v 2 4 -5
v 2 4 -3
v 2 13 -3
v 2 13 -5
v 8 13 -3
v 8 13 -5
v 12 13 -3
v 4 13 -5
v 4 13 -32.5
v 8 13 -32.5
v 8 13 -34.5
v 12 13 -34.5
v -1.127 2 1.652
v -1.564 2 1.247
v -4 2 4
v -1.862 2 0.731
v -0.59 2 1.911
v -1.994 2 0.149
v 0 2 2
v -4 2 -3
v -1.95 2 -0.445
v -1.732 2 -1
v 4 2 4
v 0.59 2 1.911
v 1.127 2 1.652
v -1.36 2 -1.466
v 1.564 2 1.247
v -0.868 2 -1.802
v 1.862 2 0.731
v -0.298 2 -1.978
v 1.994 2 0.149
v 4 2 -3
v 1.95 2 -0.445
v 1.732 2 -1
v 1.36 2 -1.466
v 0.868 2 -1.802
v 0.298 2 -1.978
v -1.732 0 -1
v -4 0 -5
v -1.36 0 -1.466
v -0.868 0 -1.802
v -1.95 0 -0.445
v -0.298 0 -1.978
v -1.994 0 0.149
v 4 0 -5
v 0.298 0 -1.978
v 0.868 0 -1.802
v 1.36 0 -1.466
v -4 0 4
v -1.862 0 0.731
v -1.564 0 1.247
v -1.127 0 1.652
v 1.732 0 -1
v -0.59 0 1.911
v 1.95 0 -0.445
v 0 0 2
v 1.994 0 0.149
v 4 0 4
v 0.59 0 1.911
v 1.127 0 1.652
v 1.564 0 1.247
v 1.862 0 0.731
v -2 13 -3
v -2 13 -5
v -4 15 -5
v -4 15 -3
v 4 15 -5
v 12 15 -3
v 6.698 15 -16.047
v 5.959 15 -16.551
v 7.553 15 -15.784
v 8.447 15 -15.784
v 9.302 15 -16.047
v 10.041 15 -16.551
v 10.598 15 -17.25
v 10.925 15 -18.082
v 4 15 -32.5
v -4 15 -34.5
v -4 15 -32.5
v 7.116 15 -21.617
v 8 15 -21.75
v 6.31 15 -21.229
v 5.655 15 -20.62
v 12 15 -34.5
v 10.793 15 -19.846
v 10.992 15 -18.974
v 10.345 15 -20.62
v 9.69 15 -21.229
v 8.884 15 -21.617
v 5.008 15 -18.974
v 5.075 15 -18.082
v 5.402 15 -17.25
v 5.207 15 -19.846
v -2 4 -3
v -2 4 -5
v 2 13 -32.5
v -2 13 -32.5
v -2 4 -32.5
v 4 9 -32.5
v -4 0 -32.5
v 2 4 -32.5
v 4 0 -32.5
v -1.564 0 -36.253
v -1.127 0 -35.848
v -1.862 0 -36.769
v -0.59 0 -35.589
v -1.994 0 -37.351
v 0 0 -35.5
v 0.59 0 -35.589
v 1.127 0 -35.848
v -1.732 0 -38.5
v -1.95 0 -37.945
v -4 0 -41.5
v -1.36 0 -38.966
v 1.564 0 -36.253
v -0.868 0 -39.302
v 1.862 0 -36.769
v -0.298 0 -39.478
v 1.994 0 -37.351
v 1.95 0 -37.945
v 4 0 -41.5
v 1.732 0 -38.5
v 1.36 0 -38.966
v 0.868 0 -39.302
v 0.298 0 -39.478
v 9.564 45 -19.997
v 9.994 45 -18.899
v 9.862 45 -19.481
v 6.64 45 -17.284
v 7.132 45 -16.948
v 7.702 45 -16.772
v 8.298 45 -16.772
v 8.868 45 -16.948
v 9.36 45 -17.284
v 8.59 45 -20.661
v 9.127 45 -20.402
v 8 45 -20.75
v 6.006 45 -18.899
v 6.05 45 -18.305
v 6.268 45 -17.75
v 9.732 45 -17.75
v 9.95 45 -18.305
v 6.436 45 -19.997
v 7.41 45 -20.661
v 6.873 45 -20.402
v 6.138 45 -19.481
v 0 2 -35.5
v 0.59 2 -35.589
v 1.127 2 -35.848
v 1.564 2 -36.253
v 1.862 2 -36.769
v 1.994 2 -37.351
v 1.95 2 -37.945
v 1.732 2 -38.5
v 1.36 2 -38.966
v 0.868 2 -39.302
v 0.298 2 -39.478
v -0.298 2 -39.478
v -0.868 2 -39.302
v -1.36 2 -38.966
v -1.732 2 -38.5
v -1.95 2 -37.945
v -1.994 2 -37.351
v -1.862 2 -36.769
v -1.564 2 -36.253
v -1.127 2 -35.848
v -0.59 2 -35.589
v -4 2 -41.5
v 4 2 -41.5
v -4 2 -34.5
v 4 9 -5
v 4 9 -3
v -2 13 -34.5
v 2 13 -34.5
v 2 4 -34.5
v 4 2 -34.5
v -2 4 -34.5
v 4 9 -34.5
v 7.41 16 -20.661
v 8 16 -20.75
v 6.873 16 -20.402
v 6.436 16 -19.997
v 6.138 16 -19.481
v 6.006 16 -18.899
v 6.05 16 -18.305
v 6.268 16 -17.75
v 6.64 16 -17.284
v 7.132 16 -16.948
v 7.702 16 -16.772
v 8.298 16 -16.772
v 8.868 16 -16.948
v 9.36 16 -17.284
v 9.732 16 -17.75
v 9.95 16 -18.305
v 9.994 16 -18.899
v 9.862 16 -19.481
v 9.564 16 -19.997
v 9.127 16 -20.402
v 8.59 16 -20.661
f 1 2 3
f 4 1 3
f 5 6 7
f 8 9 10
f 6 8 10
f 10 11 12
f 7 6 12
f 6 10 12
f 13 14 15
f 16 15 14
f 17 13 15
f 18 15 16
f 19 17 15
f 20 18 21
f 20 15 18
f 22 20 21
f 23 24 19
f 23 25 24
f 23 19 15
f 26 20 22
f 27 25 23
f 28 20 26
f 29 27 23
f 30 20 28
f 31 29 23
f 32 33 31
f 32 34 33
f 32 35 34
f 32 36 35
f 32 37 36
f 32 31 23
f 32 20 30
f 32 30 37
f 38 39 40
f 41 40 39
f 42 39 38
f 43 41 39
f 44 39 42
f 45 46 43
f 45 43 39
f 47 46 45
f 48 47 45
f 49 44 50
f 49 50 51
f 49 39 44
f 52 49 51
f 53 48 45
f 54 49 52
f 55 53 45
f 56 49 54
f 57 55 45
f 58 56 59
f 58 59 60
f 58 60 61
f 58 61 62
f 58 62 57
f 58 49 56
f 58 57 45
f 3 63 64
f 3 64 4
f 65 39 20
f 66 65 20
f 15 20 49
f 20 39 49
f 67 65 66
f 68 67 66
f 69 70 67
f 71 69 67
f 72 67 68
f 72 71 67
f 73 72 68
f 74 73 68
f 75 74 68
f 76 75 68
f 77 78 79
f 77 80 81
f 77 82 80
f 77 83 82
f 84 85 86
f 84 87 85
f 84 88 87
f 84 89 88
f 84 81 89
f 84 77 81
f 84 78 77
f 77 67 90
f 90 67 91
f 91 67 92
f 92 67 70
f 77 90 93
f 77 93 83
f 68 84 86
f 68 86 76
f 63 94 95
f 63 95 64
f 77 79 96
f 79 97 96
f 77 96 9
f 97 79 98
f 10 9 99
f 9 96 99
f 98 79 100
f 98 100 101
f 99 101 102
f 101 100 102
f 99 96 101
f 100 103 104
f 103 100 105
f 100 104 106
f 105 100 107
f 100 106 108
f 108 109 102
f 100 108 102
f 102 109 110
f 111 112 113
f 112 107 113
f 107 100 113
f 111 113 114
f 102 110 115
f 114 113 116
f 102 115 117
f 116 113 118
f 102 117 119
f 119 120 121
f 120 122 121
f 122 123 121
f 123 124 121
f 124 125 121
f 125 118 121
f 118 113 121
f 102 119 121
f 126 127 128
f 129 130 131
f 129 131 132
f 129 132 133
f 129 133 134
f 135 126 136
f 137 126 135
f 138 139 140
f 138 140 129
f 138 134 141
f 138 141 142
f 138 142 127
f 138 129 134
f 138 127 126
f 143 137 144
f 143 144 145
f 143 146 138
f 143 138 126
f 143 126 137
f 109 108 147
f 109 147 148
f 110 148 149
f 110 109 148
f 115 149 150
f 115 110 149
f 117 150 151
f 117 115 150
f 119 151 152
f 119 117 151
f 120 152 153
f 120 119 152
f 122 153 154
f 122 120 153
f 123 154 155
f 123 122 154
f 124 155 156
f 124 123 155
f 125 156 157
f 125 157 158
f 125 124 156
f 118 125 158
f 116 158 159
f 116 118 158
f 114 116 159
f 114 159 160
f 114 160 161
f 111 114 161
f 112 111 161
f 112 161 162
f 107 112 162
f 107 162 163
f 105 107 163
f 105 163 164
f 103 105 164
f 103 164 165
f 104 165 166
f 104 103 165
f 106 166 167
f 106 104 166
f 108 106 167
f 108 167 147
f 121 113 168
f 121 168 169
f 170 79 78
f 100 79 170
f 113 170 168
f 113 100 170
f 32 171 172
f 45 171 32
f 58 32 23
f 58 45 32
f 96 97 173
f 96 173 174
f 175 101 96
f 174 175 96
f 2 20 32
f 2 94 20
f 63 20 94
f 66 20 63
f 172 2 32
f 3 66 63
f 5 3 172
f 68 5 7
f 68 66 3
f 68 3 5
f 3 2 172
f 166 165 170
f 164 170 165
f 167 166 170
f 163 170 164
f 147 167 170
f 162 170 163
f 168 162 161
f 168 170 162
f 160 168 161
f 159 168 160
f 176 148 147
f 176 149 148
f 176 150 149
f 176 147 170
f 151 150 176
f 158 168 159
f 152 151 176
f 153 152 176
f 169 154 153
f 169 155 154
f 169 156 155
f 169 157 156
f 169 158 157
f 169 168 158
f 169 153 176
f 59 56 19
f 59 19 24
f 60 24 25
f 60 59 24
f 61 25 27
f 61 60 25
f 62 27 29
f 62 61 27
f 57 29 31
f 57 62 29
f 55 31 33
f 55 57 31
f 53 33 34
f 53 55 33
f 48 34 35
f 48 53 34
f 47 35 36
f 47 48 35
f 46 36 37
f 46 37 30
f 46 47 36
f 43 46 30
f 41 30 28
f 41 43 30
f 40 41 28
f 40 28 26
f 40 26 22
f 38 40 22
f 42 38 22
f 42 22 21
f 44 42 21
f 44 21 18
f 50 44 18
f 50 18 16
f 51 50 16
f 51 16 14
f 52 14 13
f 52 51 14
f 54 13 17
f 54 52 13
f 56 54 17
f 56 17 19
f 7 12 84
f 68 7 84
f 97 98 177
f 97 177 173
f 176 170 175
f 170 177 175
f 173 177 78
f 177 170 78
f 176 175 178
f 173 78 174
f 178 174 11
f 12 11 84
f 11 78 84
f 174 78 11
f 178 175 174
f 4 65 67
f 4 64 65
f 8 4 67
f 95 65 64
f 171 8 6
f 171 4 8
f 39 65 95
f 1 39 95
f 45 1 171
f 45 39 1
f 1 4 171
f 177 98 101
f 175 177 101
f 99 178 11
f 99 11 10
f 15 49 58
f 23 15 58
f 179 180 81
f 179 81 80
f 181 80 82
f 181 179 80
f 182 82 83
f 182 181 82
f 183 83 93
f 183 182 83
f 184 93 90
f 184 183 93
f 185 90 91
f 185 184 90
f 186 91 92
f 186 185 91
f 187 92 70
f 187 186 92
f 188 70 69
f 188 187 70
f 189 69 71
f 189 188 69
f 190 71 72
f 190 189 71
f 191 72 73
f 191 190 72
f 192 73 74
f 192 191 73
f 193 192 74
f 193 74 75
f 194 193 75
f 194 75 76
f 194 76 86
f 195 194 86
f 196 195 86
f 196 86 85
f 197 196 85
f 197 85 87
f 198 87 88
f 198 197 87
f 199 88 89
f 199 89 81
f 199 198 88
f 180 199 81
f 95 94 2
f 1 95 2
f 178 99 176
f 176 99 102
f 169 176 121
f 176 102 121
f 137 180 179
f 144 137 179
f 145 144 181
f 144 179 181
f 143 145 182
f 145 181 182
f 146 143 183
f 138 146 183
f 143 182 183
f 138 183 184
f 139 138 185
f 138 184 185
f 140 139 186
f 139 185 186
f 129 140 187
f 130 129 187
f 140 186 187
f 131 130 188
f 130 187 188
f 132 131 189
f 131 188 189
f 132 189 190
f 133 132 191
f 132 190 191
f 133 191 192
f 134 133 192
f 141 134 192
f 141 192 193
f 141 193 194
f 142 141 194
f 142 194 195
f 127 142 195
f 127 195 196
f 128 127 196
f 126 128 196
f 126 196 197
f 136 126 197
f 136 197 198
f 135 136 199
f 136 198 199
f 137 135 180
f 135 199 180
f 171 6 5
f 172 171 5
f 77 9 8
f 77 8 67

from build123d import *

# Parameters (mm, degrees)
SKETCH1_W             = 8
SKETCH1_H             = 8
SKETCH1_R             = 2
BOSS_EXTRUDE1_DEPTH   = 2
BOSS_EXTRUDE1_2_DEPTH = 2
SKETCH2_W             = 8
SKETCH2_H             = 2
BOSS_EXTRUDE2_DEPTH   = 15
BOSS_EXTRUDE3_REACH   = 43.512
SKETCH3_W             = 8
SKETCH3_H             = 2
CHAMFER1_SIZE         = 4
SKETCH4_W             = 4
SKETCH4_H             = 9
CUT_EXTRUDE1_DEPTH    = 44.026154836
SKETCH5_R             = 2
BOSS_EXTRUDE4_DEPTH   = 30
CHAMFER2_SIZE         = 1


with BuildPart() as part:
    # Sketch1 → Boss-Extrude1 (new body)
    with BuildSketch(Plane(origin=(0, 0, 0), x_dir=(1, 0, 0), z_dir=(0, 1, 0))):
        Rectangle(SKETCH1_W, SKETCH1_H)
        with Locations(Location((0, 0, 0), (0, 0, 270))):
            Circle(SKETCH1_R, mode=Mode.SUBTRACT)
    extrude(amount=BOSS_EXTRUDE1_DEPTH)



with BuildPart() as body_2:
    # Sketch1 → Boss-Extrude1 2 (new body)
    with BuildSketch(Plane(origin=(0, 0, 0), x_dir=(1, 0, 0), z_dir=(0, 1, 0))):
        with Locations((0, 37.5)):
            Rectangle(SKETCH1_W, SKETCH1_H)
        with Locations(Location((0, 37.5, 0), (0, 0, 270))):
            Circle(SKETCH1_R, mode=Mode.SUBTRACT)
    extrude(amount=BOSS_EXTRUDE1_2_DEPTH)


with BuildPart() as part_1:
    add(part.part)

    add(body_2.part)  # Boss-Extrude2 merges body 2
    # Sketch2 → Boss-Extrude2 (add)
    with BuildSketch(Plane.XZ):
        with Locations((0, -33.5)):
            Rectangle(SKETCH2_W, SKETCH2_H)
        with Locations((0, -4)):
            Rectangle(SKETCH2_W, SKETCH2_H)
    extrude(amount=-BOSS_EXTRUDE2_DEPTH)

    # Boss-Extrude3: up to this face of the body (flat: up to its plane)
    boss_extrude3_end = Plane(part_1.part.faces().sort_by_distance((0, 8.5, -3))[0])
    # Sketch3 → Boss-Extrude3 (add, up to the picked face)
    with BuildSketch(Plane.XY.offset(-34.5), mode=Mode.PRIVATE) as boss_extrude3_sk1:
        with Locations((8, 14)):
            Rectangle(SKETCH3_W, SKETCH3_H)
    boss_extrude3_tool1 = split(extrude(boss_extrude3_sk1.sketch, amount=BOSS_EXTRUDE3_REACH, mode=Mode.PRIVATE), bisect_by=boss_extrude3_end, keep=Keep.BOTH, mode=Mode.PRIVATE)
    add(boss_extrude3_tool1.solids().sort_by(Axis((8, 14, -34.5), (0, 0, 1)))[0])

    # Chamfer1
    chamfer1_edges = [part_1.edges().sort_by_distance(p)[0] for p in [
        (4, 13, -4),
        (4, 13, -33.5),
    ]]
    chamfer(chamfer1_edges, length=CHAMFER1_SIZE)

    # Sketch4 → Cut-Extrude1 (cut, through all)
    with BuildSketch(Plane.XY.offset(-3)):
        with Locations((0, 8.5)):
            Rectangle(SKETCH4_W, SKETCH4_H)
    extrude(amount=-CUT_EXTRUDE1_DEPTH, mode=Mode.SUBTRACT)

    # Sketch5 → Boss-Extrude4 (add)
    with BuildSketch(Plane(origin=(0, 15, 0), x_dir=(1, 0, 0), z_dir=(0, 1, 0))):
        with Locations(Location((8, 18.75, 0), (0, 0, 90))):
            Circle(SKETCH5_R)
    extrude(amount=BOSS_EXTRUDE4_DEPTH)

    # Chamfer2
    chamfer2_edges = [part_1.edges().sort_by_distance(p)[0] for p in [
        (8, 15, -16.75),
    ]]
    chamfer(chamfer2_edges, length=CHAMFER2_SIZE)


solid = part_1.part
